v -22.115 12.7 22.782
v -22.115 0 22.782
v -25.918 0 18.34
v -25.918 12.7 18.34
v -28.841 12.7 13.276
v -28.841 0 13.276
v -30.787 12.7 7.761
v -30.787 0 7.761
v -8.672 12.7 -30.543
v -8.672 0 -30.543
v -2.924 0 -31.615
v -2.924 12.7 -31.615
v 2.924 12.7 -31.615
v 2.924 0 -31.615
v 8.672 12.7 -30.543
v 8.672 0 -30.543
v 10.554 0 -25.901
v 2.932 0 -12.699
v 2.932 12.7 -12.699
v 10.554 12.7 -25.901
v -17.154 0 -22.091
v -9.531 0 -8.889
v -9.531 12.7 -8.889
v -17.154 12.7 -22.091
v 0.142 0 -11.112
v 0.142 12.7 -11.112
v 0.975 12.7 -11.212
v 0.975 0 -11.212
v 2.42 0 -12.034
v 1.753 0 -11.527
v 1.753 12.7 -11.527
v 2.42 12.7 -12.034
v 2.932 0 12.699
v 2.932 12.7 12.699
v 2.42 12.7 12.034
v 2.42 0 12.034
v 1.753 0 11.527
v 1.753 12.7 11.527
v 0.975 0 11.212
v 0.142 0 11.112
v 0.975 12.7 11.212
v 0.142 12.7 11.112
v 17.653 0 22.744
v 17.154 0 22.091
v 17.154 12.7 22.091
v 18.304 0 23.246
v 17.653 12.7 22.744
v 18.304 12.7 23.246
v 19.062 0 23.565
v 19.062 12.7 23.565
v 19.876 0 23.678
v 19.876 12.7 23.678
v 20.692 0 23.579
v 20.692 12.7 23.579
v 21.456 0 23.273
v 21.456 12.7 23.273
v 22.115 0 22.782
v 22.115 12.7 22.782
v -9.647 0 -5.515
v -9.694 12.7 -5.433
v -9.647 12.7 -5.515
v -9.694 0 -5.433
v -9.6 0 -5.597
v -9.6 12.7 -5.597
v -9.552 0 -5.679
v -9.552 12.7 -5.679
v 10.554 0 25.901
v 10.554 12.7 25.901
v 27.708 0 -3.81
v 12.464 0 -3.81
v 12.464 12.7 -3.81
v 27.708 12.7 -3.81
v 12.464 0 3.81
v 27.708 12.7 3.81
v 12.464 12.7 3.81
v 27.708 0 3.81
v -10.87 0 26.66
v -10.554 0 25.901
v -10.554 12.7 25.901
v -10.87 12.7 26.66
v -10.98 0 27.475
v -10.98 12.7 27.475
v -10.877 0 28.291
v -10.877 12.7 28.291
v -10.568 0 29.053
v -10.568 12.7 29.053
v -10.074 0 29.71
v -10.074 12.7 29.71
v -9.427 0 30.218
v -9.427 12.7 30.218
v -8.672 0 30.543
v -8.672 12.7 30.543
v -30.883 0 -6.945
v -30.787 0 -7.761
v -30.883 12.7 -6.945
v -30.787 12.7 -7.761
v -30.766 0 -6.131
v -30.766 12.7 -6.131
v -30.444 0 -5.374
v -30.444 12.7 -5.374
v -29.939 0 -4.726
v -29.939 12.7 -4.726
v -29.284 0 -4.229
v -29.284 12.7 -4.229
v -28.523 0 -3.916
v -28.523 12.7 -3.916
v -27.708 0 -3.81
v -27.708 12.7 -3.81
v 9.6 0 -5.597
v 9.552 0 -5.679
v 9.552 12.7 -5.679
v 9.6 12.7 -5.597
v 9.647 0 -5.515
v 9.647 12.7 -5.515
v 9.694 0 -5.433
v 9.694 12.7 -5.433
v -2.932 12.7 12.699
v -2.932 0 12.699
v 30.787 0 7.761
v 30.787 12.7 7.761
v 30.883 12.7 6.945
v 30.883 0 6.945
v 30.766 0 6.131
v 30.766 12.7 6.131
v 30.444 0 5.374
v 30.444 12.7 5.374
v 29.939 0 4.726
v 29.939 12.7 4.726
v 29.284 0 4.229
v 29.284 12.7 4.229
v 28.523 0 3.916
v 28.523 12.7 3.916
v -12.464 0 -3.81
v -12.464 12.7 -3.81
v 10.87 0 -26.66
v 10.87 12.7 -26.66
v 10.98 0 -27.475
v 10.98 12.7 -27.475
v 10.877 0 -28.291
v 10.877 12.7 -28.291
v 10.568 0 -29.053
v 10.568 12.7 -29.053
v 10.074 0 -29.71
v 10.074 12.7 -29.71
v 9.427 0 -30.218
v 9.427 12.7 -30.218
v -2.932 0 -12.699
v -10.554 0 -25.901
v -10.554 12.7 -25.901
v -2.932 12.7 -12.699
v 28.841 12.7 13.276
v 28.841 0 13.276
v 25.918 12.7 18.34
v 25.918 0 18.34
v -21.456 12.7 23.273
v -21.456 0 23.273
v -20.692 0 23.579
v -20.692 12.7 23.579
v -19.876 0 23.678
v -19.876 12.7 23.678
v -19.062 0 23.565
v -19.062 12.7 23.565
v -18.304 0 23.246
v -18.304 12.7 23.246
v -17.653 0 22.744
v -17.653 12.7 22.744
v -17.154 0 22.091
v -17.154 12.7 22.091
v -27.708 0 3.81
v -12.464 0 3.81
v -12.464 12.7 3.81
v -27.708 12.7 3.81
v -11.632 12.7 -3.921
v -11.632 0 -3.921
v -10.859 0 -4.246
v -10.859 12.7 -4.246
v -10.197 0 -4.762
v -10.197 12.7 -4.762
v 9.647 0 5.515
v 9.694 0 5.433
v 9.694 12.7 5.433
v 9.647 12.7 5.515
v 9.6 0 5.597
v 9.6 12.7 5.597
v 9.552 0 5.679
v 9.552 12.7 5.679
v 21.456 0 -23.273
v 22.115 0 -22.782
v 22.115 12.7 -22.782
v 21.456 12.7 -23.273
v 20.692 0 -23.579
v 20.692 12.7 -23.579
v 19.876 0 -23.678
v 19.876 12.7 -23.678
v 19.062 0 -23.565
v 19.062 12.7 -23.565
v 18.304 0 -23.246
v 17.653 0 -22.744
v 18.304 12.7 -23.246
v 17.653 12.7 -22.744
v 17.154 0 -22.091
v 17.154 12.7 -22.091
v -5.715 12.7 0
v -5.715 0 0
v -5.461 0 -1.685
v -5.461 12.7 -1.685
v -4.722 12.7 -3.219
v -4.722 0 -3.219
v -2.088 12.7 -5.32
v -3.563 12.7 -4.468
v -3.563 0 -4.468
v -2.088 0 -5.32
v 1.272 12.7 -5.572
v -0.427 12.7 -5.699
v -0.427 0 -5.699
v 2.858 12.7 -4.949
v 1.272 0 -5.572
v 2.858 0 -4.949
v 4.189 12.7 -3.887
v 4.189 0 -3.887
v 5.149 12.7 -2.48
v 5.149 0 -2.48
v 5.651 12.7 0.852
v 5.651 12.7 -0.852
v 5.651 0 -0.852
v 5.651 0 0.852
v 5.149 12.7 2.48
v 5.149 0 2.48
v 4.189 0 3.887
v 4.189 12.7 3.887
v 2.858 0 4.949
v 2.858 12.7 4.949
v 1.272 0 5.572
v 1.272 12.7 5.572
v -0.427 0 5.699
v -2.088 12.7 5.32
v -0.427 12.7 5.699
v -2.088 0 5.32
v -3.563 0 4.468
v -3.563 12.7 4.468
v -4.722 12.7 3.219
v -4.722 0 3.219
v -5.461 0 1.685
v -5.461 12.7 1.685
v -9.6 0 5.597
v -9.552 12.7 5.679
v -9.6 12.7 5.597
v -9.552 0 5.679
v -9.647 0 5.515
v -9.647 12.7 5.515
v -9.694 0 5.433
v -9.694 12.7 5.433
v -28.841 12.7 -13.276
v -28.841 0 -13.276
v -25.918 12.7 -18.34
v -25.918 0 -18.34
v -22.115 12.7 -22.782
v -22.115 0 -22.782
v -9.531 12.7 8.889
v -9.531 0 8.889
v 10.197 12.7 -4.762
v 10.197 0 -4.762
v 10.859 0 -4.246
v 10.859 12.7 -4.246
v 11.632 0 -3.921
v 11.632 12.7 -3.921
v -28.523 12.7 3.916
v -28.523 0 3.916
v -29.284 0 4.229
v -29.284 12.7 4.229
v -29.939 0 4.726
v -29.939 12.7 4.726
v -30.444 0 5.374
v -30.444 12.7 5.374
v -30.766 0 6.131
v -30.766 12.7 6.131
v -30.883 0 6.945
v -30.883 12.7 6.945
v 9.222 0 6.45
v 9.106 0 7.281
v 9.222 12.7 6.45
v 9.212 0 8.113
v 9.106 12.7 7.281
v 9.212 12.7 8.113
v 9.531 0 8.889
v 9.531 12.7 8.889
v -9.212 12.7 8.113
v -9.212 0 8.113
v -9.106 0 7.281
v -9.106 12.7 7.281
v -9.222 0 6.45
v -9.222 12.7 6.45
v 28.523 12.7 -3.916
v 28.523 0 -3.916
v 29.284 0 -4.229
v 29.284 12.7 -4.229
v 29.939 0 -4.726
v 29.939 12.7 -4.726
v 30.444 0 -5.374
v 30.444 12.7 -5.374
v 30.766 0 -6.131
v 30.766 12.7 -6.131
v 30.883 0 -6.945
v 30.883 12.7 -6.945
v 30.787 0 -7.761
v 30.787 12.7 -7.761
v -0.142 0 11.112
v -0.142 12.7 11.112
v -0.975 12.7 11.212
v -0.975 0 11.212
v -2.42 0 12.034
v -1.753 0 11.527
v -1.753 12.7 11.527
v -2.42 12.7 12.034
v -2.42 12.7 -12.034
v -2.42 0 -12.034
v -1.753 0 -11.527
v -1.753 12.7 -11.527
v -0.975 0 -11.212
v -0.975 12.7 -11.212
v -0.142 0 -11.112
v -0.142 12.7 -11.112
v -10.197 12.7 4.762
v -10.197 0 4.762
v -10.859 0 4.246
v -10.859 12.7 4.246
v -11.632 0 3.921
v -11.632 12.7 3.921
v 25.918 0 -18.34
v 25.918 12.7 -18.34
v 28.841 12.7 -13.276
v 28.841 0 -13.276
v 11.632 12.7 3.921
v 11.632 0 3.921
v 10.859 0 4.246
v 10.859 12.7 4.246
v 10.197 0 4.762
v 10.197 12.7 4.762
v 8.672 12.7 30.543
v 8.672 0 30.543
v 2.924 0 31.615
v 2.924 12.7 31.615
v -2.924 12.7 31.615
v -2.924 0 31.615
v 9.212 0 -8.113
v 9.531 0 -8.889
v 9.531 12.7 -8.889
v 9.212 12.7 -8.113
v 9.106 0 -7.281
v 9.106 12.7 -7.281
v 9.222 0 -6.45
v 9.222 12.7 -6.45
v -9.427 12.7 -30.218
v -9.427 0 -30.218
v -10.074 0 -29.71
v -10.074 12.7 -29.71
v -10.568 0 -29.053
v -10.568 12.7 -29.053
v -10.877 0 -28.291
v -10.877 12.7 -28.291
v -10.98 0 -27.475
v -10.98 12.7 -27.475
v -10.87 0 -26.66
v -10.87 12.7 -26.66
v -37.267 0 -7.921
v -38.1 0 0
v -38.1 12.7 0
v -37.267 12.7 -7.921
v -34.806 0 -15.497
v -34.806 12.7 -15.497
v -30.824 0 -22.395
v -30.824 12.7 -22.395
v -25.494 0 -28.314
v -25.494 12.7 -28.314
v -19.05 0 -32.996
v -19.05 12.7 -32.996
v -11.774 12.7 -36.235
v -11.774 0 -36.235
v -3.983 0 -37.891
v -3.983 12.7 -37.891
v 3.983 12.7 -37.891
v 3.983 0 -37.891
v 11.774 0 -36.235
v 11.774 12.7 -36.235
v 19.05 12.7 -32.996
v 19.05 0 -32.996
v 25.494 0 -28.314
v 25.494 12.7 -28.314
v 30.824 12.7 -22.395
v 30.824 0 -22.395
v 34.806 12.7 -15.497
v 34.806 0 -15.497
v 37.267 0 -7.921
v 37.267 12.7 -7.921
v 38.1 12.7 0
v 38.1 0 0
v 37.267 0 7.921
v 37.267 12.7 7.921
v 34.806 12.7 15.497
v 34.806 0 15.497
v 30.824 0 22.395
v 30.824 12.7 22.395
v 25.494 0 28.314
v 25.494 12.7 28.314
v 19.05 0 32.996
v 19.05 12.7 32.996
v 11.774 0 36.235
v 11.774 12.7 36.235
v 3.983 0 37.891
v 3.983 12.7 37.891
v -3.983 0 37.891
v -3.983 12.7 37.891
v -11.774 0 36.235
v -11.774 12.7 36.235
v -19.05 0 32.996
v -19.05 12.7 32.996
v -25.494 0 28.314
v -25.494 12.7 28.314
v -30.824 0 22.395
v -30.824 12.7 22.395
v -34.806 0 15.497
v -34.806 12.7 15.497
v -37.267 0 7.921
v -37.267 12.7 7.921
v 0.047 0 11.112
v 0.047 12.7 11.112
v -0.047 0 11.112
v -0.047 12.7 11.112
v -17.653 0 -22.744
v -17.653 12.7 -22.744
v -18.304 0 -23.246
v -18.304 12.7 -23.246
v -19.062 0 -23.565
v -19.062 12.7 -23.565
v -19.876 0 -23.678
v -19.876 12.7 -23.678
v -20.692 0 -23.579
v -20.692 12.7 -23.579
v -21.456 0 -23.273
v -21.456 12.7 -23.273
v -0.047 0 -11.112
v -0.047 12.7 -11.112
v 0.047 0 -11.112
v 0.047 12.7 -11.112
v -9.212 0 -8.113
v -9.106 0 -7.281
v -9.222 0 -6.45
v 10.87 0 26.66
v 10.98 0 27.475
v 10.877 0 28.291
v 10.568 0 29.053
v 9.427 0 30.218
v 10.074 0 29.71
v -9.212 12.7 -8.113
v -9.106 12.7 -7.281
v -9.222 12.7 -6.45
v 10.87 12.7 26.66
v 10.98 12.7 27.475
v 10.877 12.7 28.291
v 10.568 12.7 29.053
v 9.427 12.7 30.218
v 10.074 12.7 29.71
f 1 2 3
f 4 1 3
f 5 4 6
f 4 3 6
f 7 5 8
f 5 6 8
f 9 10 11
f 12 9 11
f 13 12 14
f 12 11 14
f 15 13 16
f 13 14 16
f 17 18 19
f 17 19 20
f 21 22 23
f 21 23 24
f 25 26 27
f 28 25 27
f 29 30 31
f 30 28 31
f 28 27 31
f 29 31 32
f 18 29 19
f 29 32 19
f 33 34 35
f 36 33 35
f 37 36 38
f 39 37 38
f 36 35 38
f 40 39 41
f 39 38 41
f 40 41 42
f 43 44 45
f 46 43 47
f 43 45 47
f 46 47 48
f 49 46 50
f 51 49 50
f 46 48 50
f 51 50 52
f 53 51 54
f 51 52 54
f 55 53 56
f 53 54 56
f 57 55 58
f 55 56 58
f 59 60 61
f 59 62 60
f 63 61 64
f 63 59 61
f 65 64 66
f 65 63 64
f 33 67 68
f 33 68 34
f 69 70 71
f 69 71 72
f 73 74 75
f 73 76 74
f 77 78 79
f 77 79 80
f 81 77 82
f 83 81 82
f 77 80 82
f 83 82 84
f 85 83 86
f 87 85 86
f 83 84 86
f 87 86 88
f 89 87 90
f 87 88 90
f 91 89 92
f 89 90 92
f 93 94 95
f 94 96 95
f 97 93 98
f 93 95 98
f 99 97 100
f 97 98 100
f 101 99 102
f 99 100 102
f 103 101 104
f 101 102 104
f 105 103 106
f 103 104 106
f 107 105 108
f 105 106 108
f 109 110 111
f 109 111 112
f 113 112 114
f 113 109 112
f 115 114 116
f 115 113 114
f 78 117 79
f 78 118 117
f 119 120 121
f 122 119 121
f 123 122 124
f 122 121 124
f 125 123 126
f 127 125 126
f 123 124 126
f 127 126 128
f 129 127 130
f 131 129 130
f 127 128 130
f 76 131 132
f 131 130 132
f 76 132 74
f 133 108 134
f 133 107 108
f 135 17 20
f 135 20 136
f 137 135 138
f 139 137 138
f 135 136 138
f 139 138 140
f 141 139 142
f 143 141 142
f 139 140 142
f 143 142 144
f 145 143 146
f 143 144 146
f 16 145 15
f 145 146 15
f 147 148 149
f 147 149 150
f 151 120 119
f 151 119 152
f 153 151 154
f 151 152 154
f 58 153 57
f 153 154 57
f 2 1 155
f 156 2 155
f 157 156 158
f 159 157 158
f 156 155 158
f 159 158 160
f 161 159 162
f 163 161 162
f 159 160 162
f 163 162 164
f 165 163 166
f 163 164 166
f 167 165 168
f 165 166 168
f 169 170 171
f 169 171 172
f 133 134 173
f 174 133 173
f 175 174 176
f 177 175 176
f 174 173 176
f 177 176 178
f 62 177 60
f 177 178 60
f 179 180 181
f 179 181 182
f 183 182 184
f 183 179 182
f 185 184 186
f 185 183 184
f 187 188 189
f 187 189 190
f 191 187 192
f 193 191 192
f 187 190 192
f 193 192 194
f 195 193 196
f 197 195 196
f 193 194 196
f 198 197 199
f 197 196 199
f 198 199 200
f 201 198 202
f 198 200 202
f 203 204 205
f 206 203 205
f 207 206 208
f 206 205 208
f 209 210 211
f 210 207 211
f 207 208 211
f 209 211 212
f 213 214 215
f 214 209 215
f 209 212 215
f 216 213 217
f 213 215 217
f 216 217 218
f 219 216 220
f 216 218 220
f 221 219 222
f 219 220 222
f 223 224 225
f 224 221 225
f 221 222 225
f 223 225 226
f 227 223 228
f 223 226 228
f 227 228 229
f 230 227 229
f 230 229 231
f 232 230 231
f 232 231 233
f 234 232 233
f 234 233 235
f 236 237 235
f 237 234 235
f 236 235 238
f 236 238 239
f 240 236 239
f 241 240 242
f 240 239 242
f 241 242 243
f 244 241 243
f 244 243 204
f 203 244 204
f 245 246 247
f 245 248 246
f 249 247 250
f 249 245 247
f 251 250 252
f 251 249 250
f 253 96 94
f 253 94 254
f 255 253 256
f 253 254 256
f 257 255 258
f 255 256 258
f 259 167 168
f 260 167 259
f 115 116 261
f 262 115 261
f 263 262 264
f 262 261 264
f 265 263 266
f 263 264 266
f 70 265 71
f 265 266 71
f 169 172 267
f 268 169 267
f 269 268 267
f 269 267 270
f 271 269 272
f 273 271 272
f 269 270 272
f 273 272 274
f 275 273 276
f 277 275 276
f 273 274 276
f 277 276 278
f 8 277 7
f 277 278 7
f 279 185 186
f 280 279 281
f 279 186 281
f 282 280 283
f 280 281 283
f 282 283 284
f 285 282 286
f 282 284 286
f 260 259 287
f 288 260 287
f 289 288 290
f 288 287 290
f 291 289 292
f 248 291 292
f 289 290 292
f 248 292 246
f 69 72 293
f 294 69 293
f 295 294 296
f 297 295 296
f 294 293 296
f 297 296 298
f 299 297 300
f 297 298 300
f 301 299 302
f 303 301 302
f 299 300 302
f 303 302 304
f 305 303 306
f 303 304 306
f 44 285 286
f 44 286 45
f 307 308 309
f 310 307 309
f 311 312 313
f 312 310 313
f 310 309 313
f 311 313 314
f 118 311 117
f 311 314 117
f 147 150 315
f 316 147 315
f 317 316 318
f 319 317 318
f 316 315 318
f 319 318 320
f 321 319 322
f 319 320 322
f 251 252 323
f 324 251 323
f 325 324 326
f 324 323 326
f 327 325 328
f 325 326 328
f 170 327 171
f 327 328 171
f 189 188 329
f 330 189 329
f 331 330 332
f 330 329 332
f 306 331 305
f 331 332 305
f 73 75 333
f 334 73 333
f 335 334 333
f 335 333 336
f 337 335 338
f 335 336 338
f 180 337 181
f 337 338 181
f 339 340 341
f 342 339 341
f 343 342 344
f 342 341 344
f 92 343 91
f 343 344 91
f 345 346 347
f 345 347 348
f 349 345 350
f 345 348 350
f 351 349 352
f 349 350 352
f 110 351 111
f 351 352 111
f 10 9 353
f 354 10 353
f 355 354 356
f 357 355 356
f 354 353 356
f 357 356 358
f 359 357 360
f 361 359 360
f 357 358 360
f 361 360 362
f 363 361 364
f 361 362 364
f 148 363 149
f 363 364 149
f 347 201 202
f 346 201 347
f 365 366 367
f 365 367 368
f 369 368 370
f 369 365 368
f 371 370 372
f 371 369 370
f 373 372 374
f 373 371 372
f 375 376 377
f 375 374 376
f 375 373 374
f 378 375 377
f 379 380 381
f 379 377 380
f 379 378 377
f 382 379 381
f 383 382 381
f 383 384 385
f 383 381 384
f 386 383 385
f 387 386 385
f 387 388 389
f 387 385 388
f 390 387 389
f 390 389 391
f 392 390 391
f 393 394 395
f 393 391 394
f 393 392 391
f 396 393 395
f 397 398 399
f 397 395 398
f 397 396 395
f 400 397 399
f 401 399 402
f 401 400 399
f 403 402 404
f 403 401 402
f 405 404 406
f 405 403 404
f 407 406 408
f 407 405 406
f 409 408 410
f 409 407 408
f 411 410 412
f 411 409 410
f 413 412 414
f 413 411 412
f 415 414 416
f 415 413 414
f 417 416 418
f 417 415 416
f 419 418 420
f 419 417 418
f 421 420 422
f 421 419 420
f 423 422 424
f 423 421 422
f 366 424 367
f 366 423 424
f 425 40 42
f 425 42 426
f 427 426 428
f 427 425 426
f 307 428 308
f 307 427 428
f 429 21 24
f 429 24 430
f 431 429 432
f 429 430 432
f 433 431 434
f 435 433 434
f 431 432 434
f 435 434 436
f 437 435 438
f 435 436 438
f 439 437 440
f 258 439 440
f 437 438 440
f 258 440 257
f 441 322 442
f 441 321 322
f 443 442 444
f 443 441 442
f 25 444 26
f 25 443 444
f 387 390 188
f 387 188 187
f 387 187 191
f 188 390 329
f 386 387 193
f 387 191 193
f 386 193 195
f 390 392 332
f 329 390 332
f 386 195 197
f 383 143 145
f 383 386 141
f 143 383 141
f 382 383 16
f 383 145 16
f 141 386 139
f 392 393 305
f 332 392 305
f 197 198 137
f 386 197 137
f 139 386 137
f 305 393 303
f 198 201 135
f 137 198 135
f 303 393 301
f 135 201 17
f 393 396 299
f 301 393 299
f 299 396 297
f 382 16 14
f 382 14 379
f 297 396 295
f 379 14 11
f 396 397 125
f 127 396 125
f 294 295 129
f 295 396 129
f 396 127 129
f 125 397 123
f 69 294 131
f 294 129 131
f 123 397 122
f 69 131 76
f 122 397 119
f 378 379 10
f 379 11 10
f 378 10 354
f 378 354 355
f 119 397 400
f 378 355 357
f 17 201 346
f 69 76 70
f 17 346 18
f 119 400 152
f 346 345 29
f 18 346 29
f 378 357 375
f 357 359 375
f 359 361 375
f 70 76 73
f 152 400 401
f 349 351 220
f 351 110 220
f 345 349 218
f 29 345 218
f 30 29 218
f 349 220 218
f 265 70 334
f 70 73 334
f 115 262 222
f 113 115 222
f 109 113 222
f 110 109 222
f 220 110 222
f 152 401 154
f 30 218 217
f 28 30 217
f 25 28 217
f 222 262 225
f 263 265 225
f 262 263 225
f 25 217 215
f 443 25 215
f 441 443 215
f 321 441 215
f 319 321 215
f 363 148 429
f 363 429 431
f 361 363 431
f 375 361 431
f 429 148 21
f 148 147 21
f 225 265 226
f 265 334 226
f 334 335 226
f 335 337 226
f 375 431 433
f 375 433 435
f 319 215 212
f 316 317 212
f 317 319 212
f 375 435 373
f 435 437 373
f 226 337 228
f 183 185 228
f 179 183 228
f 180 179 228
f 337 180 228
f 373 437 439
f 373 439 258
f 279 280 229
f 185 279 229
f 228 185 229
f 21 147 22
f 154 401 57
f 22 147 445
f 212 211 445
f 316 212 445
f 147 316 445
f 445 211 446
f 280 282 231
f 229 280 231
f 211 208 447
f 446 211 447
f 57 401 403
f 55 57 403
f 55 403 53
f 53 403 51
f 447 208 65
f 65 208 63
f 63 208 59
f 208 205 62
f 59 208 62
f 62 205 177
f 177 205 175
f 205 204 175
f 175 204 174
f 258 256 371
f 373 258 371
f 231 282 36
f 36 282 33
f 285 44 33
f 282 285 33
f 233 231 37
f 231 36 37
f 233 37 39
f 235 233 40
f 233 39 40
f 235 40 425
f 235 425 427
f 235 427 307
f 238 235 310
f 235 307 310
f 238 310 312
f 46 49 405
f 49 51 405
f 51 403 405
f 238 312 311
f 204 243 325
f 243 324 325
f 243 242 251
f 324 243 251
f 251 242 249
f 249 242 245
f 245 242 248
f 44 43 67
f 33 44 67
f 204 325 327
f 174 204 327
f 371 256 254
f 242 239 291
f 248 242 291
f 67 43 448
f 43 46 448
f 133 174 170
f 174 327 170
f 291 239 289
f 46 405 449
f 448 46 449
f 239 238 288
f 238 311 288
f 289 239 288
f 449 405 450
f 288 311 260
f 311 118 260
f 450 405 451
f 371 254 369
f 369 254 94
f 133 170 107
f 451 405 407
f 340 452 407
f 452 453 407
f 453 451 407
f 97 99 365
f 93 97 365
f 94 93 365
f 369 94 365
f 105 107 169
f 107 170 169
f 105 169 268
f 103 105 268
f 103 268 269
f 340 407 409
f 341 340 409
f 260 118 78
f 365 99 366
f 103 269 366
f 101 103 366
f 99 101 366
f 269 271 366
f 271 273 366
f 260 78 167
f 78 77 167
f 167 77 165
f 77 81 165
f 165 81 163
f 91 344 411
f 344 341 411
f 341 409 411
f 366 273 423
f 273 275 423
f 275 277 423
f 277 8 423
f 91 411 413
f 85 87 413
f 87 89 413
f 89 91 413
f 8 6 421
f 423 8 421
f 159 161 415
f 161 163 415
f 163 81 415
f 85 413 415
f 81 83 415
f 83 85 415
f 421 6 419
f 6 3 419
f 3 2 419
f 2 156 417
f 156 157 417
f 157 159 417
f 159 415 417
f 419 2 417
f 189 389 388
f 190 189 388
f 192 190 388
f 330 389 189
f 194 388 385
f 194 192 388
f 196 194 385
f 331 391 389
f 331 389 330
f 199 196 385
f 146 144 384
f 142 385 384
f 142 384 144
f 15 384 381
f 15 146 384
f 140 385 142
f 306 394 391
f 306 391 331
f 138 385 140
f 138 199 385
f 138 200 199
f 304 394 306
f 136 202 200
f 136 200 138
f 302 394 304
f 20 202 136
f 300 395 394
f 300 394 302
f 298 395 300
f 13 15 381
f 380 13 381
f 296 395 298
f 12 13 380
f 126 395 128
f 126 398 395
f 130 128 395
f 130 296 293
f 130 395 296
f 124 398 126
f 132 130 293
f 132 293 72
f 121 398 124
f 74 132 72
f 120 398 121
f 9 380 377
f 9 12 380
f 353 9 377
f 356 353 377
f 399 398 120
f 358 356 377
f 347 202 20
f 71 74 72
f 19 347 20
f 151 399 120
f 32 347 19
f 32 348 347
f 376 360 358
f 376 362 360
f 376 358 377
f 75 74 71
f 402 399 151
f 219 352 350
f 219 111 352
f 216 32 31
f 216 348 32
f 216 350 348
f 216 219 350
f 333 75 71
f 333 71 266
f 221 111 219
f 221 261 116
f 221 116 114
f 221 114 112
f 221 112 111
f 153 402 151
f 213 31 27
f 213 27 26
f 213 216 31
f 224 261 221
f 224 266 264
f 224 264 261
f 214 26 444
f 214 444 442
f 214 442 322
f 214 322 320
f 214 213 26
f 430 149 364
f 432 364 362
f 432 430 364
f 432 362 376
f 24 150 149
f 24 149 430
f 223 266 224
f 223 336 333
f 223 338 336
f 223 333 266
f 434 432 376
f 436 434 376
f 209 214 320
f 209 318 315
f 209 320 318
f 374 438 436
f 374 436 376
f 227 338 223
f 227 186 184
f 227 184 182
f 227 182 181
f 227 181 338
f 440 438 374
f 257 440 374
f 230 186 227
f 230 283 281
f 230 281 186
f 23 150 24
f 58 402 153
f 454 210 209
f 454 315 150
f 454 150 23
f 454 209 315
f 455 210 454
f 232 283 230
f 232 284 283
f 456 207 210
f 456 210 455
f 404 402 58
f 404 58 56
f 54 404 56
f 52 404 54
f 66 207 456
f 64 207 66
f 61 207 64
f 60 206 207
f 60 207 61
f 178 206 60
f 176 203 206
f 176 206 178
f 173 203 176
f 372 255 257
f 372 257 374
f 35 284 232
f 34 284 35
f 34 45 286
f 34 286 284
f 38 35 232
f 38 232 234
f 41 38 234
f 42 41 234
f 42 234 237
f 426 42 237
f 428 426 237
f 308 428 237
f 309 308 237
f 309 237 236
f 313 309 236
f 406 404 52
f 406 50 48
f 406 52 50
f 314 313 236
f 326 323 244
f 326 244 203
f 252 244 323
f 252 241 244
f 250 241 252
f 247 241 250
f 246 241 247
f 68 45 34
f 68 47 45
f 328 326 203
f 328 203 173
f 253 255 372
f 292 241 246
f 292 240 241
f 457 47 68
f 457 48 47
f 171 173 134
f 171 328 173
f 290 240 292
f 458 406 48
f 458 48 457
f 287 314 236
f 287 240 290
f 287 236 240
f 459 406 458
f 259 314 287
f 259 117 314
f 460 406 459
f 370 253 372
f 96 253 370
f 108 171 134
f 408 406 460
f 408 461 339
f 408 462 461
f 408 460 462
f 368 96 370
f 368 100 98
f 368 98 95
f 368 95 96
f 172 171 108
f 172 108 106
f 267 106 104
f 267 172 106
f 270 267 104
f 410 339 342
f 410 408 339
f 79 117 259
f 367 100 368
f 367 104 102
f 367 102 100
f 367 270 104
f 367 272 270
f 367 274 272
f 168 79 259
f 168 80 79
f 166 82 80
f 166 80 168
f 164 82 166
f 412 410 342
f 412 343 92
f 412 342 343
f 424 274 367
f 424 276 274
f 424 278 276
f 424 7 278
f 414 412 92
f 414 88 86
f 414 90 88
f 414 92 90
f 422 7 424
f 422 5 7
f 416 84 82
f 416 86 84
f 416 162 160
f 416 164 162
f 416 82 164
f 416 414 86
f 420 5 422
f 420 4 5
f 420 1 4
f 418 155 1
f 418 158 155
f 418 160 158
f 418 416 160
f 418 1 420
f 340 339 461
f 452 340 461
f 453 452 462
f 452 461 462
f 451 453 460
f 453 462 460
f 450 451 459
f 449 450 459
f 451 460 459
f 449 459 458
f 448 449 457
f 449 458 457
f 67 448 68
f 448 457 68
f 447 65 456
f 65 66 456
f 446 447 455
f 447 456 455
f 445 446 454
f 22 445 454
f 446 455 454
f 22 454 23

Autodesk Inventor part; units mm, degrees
ref_plane "YZ Plane" through (0, 0, 0) normal (1, 0, 0) x (0, 1, 0)
ref_plane "XZ Plane" through (0, 0, 0) normal (0, 1, 0) x (-1, 0, 0)
ref_plane "XY Plane" through (0, 0, 0) normal (0, 0, 1) x (1, 0, 0)
sketch "Sketch1" plane through (0, 0, 0) normal (0, 1, 0) x (-1, 0, 0)
  circle A0 centre (0, 0) radius 38.1
  circle A1 centre (0, 0) radius 5.715
  line L0 (10.4389, 3.81) -> (31.5206, 3.81)
  line L1 (31.5206, -3.81) -> (10.4389, -3.81)
  line L2 (1.9199, 10.9454) -> (12.4607, 29.2026)
  line L3 (19.0598, 25.3926) -> (8.519, 7.1354)
  line L4 (-8.519, 7.1354) -> (-19.0598, 25.3926)
  line L5 (-12.4607, 29.2026) -> (-1.9199, 10.9454)
  line L6 (-10.4389, -3.81) -> (-31.5206, -3.81)
  line L7 (-31.5206, 3.81) -> (-10.4389, 3.81)
  line L8 (-1.9199, -10.9454) -> (-12.4607, -29.2026)
  line L9 (-19.0598, -25.3926) -> (-8.519, -7.1354)
  line L10 (8.519, -7.1354) -> (19.0598, -25.3926)
  line L11 (12.4607, -29.2026) -> (1.9199, -10.9454)
  arc A2 (10.4389, 3.81) -> (8.519, 7.1354) centre (0, 0) ccw
  arc A3 (1.9199, 10.9454) -> (-1.9199, 10.9454) centre (0, 0) ccw
  arc A4 (-8.519, 7.1354) -> (-10.4389, 3.81) centre (0, 0) ccw
  arc A5 (-10.4389, -3.81) -> (-8.519, -7.1354) centre (0, 0) ccw
  arc A6 (-1.9199, -10.9454) -> (1.9199, -10.9454) centre (0, 0) ccw
  arc A7 (8.519, -7.1354) -> (10.4389, -3.81) centre (0, 0) ccw
  arc A8 (19.0598, -25.3926) -> (31.5206, -3.81) centre (0, 0) ccw
  arc A9 (31.5206, 3.81) -> (19.0598, 25.3926) centre (0, 0) ccw
  arc A10 (12.4607, 29.2026) -> (-12.4607, 29.2026) centre (0, 0) ccw
  arc A11 (-19.0598, 25.3926) -> (-31.5206, 3.81) centre (0, 0) ccw
  arc A12 (-31.5206, -3.81) -> (-19.0598, -25.3926) centre (0, 0) ccw
  arc A13 (-12.4607, -29.2026) -> (12.4607, -29.2026) centre (0, 0) ccw
  dimension "d0" = 76.2
  dimension "d1" = 11.43
  dimension "d4" = 3.81
  dimension "d5" = 3.81
  dimension "d8" = 360
  dimension "d10" = 31.75
  dimension "d11" = 11.1125
extrude "Extrusion1" add sketch "Sketch1" along normal blind 12.7
fillet "Fillet1" radius 3.175 24 edges at (-19.0598, 6.35, 25.3926) (-12.4607, 6.35, 29.2026) (12.4607, 6.35, 29.2026) (19.0598, 6.35, 25.3926) (31.5206, 6.35, 3.81) (31.5206, 6.35, -3.81) (19.0598, 6.35, -25.3926) (12.4607, 6.35, -29.2026) (-12.4607, 6.35, -29.2026) (-19.0598, 6.35, -25.3926) (-31.5206, 6.35, -3.81) (-31.5206, 6.35, 3.81) (-8.519, 6.35, 7.1354) (-8.519, 6.35, -7.1354) (-10.4389, 6.35, -3.81) (-10.4389, 6.35, 3.81) (-1.9199, 6.35, 10.9454) (1.9199, 6.35, 10.9454) (8.519, 6.35, 7.1354) (10.4389, 6.35, 3.81) (10.4389, 6.35, -3.81) (8.519, 6.35, -7.1354) (1.9199, 6.35, -10.9454) (-1.9199, 6.35, -10.9454)
properties part number "3in flex"
